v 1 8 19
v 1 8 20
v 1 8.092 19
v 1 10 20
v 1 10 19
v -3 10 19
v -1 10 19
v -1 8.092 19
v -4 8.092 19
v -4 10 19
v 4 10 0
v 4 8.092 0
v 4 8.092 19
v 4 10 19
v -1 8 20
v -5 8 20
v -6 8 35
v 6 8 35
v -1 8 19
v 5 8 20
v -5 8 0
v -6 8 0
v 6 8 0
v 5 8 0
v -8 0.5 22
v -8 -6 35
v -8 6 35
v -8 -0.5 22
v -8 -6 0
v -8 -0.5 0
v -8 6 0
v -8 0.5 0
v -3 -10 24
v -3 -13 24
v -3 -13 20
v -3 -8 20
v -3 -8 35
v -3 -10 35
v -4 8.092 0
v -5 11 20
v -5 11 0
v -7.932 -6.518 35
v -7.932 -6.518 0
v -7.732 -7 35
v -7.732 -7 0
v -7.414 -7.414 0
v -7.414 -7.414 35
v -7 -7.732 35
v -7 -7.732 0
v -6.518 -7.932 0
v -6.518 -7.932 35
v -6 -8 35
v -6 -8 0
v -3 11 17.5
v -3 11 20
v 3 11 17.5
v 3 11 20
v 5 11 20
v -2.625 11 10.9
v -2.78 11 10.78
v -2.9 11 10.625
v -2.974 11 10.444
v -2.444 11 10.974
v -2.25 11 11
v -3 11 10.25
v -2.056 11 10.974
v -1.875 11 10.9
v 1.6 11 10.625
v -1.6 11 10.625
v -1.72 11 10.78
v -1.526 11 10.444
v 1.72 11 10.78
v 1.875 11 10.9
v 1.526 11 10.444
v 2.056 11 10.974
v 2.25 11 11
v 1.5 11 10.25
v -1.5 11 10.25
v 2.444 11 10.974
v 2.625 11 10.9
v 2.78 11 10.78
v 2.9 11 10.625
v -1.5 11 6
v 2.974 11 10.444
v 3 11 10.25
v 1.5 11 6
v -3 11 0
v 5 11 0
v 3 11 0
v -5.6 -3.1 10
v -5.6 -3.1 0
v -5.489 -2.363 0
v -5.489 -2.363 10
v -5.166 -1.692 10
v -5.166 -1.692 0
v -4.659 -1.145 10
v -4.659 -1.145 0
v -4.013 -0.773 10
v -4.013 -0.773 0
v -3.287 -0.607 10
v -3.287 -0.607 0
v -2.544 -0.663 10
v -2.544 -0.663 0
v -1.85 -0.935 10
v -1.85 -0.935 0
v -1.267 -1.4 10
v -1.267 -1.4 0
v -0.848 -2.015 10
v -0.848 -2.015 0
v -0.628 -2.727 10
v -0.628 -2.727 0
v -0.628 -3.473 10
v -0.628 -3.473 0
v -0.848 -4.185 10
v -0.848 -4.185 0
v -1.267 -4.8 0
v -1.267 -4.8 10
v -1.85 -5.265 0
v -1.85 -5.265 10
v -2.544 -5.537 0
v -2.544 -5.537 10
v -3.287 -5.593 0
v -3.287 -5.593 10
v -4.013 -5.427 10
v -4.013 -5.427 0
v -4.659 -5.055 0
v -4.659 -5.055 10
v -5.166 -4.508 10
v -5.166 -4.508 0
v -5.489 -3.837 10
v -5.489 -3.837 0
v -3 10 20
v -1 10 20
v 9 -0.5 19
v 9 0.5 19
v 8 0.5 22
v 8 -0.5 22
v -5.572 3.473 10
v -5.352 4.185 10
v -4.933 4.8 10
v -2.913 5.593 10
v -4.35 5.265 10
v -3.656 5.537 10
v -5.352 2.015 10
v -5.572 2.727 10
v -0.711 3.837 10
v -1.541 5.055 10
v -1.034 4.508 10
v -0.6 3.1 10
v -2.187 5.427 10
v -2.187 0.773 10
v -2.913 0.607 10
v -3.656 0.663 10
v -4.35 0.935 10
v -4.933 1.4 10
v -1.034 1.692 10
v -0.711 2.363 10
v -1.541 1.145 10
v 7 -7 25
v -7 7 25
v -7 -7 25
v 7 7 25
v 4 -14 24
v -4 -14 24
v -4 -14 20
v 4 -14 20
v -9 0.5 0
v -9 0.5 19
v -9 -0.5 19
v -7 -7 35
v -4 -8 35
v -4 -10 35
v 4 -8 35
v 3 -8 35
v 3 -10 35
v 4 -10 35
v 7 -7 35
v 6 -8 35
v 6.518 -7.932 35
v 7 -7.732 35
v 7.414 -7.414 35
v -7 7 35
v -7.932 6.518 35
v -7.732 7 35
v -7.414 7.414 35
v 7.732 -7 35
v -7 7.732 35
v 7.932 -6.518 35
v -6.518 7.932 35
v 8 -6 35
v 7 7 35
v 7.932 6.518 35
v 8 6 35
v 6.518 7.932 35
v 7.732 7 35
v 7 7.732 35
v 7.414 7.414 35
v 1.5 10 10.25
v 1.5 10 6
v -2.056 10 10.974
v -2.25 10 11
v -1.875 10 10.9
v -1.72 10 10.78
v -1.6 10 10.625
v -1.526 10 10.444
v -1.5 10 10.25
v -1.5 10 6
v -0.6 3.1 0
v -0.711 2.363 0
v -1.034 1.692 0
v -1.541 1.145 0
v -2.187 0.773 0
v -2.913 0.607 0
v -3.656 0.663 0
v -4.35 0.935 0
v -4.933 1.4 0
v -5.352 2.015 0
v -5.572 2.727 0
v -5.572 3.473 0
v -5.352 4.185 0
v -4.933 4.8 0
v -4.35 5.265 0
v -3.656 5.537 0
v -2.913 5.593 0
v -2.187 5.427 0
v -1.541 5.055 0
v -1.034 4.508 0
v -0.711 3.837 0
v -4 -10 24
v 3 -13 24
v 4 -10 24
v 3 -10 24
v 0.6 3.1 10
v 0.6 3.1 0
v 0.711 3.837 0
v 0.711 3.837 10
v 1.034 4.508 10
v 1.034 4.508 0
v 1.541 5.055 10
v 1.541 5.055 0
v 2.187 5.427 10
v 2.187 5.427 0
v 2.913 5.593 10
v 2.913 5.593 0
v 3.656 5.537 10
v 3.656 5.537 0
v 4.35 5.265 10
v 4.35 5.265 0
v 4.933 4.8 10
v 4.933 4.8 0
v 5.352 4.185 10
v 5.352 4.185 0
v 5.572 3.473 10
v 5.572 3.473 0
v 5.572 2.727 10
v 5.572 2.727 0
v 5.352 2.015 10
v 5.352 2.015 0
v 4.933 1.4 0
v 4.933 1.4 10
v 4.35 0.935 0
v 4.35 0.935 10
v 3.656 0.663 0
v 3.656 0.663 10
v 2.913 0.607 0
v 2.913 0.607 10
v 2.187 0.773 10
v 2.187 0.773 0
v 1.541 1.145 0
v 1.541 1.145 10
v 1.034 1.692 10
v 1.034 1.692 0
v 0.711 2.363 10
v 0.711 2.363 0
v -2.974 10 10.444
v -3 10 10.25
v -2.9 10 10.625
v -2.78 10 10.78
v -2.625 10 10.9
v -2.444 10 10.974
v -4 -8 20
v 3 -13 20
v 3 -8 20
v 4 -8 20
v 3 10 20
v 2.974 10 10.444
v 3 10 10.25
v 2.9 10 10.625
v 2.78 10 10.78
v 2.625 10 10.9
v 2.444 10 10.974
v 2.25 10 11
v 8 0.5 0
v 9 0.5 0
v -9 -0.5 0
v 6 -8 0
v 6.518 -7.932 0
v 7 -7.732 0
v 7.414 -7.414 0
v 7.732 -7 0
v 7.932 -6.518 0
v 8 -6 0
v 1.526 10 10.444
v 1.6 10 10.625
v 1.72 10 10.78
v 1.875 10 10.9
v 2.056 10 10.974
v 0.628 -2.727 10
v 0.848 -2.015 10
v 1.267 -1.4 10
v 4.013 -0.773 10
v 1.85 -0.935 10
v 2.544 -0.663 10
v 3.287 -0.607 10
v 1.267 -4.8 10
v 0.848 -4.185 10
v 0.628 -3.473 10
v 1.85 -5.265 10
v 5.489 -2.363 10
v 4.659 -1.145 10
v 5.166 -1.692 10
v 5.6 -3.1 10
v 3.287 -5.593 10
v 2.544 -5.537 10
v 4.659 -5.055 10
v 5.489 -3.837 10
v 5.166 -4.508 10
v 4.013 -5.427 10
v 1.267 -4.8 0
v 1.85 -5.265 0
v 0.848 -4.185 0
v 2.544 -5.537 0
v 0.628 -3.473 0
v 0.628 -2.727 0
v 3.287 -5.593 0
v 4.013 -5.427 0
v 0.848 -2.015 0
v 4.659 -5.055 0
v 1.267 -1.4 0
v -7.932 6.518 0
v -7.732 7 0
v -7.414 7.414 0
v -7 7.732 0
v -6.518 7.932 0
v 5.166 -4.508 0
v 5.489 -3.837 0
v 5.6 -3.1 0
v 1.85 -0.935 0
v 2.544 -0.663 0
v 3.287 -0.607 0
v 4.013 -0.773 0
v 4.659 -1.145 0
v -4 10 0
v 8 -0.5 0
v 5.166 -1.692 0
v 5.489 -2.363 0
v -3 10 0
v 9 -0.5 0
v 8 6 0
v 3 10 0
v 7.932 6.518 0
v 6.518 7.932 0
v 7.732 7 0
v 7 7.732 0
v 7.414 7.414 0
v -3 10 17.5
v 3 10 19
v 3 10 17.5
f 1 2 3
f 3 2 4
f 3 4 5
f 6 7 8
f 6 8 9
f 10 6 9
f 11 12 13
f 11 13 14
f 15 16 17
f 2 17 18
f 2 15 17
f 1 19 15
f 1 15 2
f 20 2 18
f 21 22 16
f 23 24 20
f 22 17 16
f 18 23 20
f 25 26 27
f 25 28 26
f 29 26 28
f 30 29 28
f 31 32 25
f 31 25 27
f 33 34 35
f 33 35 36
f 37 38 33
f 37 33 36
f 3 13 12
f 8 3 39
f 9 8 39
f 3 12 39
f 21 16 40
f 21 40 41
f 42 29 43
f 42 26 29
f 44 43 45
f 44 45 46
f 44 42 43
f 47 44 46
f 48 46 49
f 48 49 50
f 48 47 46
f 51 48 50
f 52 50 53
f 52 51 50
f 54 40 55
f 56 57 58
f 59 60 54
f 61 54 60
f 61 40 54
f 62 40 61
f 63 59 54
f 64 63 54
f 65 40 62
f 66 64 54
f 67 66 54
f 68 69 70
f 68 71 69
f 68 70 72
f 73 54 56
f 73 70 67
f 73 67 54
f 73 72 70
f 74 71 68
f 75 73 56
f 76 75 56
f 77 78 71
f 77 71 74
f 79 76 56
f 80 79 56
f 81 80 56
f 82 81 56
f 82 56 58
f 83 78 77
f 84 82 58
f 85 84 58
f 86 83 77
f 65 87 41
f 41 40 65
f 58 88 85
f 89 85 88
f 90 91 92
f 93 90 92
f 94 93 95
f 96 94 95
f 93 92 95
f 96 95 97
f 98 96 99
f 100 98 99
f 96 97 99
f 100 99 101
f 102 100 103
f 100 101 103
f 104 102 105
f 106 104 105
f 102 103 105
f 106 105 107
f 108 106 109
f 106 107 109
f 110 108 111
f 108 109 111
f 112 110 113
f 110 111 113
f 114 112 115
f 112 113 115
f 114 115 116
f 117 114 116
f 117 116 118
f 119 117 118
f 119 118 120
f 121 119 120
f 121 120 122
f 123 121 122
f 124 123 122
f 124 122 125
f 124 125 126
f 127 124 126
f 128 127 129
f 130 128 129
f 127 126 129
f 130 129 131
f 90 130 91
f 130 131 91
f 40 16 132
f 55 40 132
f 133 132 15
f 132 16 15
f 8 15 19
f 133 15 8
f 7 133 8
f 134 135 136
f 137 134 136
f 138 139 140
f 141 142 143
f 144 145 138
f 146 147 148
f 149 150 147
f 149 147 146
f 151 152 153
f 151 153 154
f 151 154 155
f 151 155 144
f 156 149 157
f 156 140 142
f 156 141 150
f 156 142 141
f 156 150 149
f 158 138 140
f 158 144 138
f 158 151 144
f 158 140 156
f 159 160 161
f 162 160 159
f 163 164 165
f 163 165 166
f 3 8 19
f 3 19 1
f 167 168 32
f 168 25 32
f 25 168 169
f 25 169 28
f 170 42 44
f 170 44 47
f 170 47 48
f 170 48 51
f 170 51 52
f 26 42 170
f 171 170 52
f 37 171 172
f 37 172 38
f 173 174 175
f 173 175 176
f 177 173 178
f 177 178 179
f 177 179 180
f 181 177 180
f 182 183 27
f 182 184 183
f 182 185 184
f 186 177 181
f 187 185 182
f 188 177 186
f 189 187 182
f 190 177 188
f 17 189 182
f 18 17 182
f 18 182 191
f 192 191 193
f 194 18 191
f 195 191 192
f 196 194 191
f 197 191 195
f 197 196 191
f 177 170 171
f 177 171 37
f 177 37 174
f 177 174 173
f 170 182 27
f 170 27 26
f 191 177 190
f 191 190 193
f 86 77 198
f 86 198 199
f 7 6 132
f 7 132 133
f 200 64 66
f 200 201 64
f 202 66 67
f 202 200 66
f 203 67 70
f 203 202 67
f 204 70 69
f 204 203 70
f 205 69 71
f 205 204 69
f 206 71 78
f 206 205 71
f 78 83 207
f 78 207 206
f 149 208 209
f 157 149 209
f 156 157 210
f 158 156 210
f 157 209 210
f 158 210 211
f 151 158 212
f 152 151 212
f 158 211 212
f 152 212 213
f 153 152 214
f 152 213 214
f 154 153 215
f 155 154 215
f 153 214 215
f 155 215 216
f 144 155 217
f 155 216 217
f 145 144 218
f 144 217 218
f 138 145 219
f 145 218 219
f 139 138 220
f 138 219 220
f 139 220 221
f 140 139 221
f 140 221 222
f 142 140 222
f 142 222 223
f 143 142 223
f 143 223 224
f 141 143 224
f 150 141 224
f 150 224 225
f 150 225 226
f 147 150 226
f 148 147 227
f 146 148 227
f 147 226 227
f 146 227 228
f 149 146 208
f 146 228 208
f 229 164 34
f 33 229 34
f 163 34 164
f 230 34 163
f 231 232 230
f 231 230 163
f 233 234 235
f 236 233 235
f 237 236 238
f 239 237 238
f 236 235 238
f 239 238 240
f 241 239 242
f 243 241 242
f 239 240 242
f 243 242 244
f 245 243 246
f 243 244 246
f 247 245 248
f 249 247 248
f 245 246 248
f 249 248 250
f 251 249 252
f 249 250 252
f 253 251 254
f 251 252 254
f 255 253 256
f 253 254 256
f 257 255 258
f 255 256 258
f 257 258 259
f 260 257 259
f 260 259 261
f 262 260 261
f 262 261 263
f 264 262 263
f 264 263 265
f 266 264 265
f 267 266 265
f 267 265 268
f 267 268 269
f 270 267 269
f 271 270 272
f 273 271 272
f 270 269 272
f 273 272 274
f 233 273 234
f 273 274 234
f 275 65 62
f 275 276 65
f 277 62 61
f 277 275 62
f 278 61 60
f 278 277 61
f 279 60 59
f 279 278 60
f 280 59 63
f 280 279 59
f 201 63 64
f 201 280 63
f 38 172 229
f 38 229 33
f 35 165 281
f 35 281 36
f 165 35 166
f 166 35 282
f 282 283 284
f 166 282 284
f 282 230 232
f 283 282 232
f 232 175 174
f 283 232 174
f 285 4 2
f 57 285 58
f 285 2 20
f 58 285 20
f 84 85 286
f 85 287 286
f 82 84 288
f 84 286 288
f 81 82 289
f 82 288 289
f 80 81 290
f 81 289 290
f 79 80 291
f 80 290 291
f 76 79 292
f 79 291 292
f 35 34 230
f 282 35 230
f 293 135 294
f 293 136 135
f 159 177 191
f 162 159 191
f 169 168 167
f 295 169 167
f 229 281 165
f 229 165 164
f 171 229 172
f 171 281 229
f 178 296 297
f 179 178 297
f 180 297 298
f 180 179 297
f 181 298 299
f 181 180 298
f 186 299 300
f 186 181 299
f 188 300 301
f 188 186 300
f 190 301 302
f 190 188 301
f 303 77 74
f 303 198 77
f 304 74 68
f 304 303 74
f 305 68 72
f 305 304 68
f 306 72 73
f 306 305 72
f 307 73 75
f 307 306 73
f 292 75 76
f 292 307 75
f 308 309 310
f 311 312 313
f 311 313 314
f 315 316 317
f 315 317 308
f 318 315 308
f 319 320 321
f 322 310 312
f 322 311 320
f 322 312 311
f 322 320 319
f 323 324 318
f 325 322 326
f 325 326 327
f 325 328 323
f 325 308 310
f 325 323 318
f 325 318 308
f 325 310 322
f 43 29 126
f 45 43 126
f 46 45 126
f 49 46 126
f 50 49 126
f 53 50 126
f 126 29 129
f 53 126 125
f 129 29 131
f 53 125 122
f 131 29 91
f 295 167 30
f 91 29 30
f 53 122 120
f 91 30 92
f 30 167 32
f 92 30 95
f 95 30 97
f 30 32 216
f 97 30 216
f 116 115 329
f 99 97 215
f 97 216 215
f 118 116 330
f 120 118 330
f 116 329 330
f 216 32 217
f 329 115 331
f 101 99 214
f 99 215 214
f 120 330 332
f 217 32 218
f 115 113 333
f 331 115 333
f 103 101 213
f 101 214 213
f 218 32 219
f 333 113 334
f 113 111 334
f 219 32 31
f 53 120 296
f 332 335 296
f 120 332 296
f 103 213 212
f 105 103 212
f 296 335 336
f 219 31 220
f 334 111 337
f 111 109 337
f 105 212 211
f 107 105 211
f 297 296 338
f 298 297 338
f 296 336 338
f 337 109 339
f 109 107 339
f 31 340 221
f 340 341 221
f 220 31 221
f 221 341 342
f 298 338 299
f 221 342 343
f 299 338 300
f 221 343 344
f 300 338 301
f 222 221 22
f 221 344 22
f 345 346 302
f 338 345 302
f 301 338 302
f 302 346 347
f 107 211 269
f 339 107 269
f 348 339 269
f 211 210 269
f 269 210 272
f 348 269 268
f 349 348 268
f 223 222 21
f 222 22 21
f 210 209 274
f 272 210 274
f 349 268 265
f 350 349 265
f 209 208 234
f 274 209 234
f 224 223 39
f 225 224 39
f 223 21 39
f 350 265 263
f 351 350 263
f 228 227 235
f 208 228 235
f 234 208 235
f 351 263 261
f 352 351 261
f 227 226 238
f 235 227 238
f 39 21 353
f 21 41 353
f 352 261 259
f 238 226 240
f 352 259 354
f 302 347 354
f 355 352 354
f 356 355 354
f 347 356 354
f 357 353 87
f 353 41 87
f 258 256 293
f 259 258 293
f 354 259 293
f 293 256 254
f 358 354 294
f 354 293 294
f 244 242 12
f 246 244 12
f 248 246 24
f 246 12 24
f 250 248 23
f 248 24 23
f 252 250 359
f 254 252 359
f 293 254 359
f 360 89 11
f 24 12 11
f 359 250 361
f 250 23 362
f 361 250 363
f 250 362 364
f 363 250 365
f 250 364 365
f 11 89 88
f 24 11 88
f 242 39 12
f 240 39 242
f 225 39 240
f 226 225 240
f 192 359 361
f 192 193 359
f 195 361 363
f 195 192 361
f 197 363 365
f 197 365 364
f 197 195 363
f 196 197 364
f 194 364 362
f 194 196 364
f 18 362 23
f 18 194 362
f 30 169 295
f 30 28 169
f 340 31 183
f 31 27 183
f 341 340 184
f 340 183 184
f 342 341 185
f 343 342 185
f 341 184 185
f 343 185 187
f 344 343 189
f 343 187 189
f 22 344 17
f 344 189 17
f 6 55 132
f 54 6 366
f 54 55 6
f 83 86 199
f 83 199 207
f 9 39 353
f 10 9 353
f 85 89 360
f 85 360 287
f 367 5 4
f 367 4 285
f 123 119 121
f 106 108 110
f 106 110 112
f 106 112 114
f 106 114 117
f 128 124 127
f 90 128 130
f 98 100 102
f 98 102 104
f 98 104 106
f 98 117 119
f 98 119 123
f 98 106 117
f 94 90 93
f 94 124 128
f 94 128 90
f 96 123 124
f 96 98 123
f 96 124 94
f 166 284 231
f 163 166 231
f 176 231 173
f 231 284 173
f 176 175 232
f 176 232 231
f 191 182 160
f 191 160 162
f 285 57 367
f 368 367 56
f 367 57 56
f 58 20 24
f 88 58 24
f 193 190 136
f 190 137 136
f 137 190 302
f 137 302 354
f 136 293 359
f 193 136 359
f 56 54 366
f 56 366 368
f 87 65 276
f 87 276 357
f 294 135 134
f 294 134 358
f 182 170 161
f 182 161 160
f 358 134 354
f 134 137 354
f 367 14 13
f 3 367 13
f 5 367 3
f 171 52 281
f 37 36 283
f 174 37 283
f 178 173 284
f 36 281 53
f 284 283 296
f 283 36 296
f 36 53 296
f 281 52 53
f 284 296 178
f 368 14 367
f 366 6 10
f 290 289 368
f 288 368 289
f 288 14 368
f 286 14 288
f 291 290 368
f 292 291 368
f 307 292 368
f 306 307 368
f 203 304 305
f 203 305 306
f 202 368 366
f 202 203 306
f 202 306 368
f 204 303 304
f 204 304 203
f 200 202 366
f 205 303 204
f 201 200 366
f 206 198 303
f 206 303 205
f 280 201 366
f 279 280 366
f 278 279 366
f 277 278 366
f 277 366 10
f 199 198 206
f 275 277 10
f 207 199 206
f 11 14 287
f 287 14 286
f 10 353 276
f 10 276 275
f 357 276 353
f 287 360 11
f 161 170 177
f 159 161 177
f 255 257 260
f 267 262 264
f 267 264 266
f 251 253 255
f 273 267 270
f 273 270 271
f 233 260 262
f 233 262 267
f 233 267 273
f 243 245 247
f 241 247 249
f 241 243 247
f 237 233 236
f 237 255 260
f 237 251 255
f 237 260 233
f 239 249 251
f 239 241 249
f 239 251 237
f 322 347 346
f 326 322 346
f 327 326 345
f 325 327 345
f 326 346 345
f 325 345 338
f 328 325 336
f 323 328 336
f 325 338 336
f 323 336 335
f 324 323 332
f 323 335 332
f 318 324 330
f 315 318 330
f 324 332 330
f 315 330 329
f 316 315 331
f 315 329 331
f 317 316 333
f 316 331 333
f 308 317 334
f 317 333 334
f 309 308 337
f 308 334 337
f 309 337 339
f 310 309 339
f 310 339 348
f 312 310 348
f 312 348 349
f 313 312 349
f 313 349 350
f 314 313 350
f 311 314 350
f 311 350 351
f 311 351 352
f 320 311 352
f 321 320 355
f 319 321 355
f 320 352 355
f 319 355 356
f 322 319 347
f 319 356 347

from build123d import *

# Parameters (mm, degrees)
SKETCH_1_W           = 16
SKETCH_1_H           = 16
EXTRUDE_1_DEPTH      = 35
FILLET_1_R           = 2
SKETCH_2_W           = 8
SKETCH_2_H           = 15
EXTRUDE_2_DEPTH      = 6
CUT_EXTRUDE_2_REACH  = 40.536
SKETCH_3_W           = 6
SKETCH_3_H           = 5
SKETCH_7_W           = 8
SKETCH_7_H           = 4
CUT_EXTRUDE_4_DEPTH  = 11
SKETCH_8_W           = 10
SKETCH_8_H           = 20
EXTRUDE_3_DEPTH      = 3
SKETCH_9_W           = 6
SKETCH_9_H           = 2.5
CUT_EXTRUDE_5_DEPTH  = 1
FILLET_2_R           = 0.75
SKETCH_10_R          = 2.5
CUT_EXTRUDE_6_DEPTH  = 10
SKETCH_11_W          = 14
SKETCH_11_H          = 14
CUT_EXTRUDE_7_DEPTH  = 10
SKETCH_12_W          = 8
SKETCH_12_H          = 1.908274713
CUT_EXTRUDE_8_DEPTH  = 19
SKETCH_13_W          = 2
SKETCH_13_H          = 1
CUT_EXTRUDE_9_DEPTH  = 2
SKETCH_14_W          = 22
SKETCH_14_H          = 1
EXTRUDE_4_DEPTH      = 1
CUT_EXTRUDE_10_DEPTH = 1


with BuildPart() as part:
    # ｽｹｯﾁ1 → ﾎﾞｽ - 押し出し1 (new body)
    with BuildSketch(Plane.XY):
        Rectangle(SKETCH_1_W, SKETCH_1_H)
    extrude(amount=EXTRUDE_1_DEPTH)

    # ﾌｨﾚｯﾄ1
    fillet_1_edges = [part.edges().sort_by_distance(p)[0] for p in [
        (-8, 8, 17.5),
        (8, 8, 17.5),
        (8, -8, 17.5),
        (-8, -8, 17.5),
    ]]
    fillet(fillet_1_edges, radius=FILLET_1_R)

    # ｽｹｯﾁ2 → ﾎﾞｽ - 押し出し2 (add)
    with BuildSketch(Plane.XZ.offset(8)):
        with Locations((0, 27.5)):
            Rectangle(SKETCH_2_W, SKETCH_2_H)
    extrude(amount=EXTRUDE_2_DEPTH)

    # ｽｹｯﾁ3 → ｶｯﾄ - 押し出し2 (cut, up to next)
    with BuildSketch(Plane.XY.offset(35), mode=Mode.PRIVATE) as cut_extrude_2_sk1:
        with Locations((0, -10.5)):
            Rectangle(SKETCH_3_W, SKETCH_3_H)
    cut_extrude_2_tool1 = extrude(cut_extrude_2_sk1.sketch, amount=-CUT_EXTRUDE_2_REACH, mode=Mode.PRIVATE) & part.part
    add(cut_extrude_2_tool1.solids().sort_by_distance((0, -10.5, 35))[0], mode=Mode.SUBTRACT)

    # ｽｹｯﾁ7 → ｶｯﾄ - 押し出し4 (cut)
    with BuildSketch(Plane.XY.offset(35)):
        with Locations((0, -12)):
            Rectangle(SKETCH_7_W, SKETCH_7_H)
    extrude(amount=-CUT_EXTRUDE_4_DEPTH, mode=Mode.SUBTRACT)

    # ｽｹｯﾁ8 → ﾎﾞｽ - 押し出し3 (add)
    with BuildSketch(Plane(origin=(0, 8, 0), x_dir=(1, 0, 0), z_dir=(0, 1, 0))):
        with Locations((0, -10)):
            Rectangle(SKETCH_8_W, SKETCH_8_H)
    extrude(amount=EXTRUDE_3_DEPTH)

    # ｽｹｯﾁ9 → ｶｯﾄ - 押し出し5 (cut)
    with BuildSketch(Plane(origin=(0, 11, 0), x_dir=(1, 0, 0), z_dir=(0, 1, 0))):
        Polygon((3, 0), (3, -11), (1.5, -11), (1.5, -6), (-1.5, -6), (-1.5, -11), (-3, -11), (-3, 0), align=None)
        with Locations((0, -18.75)):
            Rectangle(SKETCH_9_W, SKETCH_9_H)
    extrude(amount=-CUT_EXTRUDE_5_DEPTH, mode=Mode.SUBTRACT)

    # ﾌｨﾚｯﾄ2
    fillet_2_edges = [part.edges().sort_by_distance(p)[0] for p in [
        (-3, 10.5, 11),
        (-1.5, 10.5, 11),
        (1.5, 10.5, 11),
        (3, 10.5, 11),
    ]]
    fillet(fillet_2_edges, radius=FILLET_2_R - 0.0001)  # a hair under: the kernel refuses the full size

    # ｽｹｯﾁ10 → ｶｯﾄ - 押し出し6 (cut)
    with BuildSketch(Plane(origin=(0, 0, 0), x_dir=(-1, 0, 0), z_dir=(0, 0, -1))):
        with Locations((-3.1, 3.1)):
            Circle(SKETCH_10_R)
        with Locations(Location((3.1, 3.1, 0), (0, 0, 180))):
            Circle(SKETCH_10_R)
        with Locations((3.1, -3.1)):
            Circle(SKETCH_10_R)
        with Locations(Location((-3.1, -3.1, 0), (0, 0, 180))):
            Circle(SKETCH_10_R)
    extrude(amount=-CUT_EXTRUDE_6_DEPTH, mode=Mode.SUBTRACT)

    # ｽｹｯﾁ11 → ｶｯﾄ - 押し出し7 (cut)
    with BuildSketch(Plane.XY.offset(35)):
        Rectangle(SKETCH_11_W, SKETCH_11_H)
    extrude(amount=-CUT_EXTRUDE_7_DEPTH, mode=Mode.SUBTRACT)

    # ｽｹｯﾁ12 → ｶｯﾄ - 押し出し8 (cut)
    with BuildSketch(Plane(origin=(0, 0, 0), x_dir=(-1, 0, 0), z_dir=(0, 0, -1))):
        with Locations((0, 9.045862644)):
            Rectangle(SKETCH_12_W, SKETCH_12_H)
    extrude(amount=-CUT_EXTRUDE_8_DEPTH, mode=Mode.SUBTRACT)

    # ｽｹｯﾁ13 → ｶｯﾄ - 押し出し9 (cut)
    with BuildSketch(Plane(origin=(0, 10, 0), x_dir=(1, 0, 0), z_dir=(0, 1, 0))):
        with Locations((0, -19.5)):
            Rectangle(SKETCH_13_W, SKETCH_13_H)
    extrude(amount=-CUT_EXTRUDE_9_DEPTH, mode=Mode.SUBTRACT)

    # ｽｹｯﾁ14 → ﾎﾞｽ - 押し出し4 (add)
    with BuildSketch(Plane(origin=(8, 0, 0), x_dir=(0, 0, -1), z_dir=(1, 0, 0))):
        with Locations((-11, 0)):
            Rectangle(SKETCH_14_W, SKETCH_14_H)
    extrude_4 = extrude(amount=EXTRUDE_4_DEPTH)

    # ｽｹｯﾁ16 → ｶｯﾄ - 押し出し10 (cut)
    with BuildSketch(Plane(origin=(0, 0.5, 0), x_dir=(1, 0, 0), z_dir=(0, 1, 0))):
        Polygon((8, -22), (9, -22), (9, -19), align=None)
    cut_extrude_10 = extrude(amount=-CUT_EXTRUDE_10_DEPTH, mode=Mode.SUBTRACT)

    # ﾐﾗｰ1: ﾎﾞｽ - 押し出し4 across plane
    add(extrude_4.mirror(Plane(origin=(0, 0, 0), x_dir=(0, 0, 1), z_dir=(1, 0, 0))))

    # ﾐﾗｰ2: ｶｯﾄ - 押し出し10 across plane
    add(cut_extrude_10.mirror(Plane(origin=(0, 0, 0), x_dir=(0, 0, 1), z_dir=(1, 0, 0))), mode=Mode.SUBTRACT)


solid = part.part
